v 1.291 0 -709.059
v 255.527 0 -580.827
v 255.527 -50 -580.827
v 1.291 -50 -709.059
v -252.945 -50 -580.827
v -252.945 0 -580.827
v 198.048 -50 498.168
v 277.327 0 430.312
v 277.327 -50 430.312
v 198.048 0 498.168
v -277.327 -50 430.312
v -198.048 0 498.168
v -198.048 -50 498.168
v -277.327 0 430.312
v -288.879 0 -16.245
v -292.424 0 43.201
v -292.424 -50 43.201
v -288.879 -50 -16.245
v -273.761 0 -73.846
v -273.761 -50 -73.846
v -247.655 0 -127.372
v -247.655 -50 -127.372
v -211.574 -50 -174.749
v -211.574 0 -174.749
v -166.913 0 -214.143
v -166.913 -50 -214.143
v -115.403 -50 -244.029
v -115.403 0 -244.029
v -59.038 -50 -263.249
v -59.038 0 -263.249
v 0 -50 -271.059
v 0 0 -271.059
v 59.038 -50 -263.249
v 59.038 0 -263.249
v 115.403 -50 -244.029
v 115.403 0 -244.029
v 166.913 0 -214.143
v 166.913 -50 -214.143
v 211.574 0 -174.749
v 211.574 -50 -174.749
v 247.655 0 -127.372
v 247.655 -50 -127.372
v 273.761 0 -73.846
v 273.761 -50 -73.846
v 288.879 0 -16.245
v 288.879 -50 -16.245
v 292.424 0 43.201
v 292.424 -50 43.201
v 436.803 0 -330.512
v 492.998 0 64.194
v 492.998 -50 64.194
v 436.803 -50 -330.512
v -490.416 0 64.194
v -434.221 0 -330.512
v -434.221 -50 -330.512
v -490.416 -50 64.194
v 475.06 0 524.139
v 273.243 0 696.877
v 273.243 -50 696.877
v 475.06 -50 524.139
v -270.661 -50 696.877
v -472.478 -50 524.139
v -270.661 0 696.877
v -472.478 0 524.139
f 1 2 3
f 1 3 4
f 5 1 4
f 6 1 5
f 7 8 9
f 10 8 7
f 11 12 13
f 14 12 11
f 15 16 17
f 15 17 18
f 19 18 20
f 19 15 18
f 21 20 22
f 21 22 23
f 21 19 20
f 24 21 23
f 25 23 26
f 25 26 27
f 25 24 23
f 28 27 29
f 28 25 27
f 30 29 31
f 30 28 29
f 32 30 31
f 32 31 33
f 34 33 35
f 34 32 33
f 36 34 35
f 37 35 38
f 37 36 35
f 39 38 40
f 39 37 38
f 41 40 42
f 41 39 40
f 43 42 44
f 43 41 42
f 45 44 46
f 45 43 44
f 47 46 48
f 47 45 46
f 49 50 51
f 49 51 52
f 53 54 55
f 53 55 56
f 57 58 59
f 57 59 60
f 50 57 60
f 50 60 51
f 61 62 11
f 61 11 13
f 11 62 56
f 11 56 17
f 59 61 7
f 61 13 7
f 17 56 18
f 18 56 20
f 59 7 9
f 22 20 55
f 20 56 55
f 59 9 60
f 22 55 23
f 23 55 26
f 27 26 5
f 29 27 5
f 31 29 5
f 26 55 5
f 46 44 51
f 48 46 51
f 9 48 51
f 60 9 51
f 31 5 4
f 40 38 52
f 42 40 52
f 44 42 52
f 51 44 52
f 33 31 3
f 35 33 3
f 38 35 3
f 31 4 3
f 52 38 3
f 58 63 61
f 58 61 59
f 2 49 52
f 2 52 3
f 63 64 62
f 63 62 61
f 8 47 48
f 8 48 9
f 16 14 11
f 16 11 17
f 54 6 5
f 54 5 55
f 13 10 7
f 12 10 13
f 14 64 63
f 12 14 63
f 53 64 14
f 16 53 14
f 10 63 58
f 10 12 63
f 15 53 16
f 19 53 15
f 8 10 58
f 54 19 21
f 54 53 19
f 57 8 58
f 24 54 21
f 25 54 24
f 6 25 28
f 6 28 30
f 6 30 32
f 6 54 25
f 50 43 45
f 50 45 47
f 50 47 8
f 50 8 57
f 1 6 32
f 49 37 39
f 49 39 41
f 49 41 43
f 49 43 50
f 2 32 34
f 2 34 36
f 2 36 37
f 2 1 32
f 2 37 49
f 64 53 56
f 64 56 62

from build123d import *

# Parameters (mm, degrees)
BOSS_EXTRUDE1_DEPTH = 50


with BuildPart() as part:
    # Sketch1 → Boss-Extrude1 (new body)
    with BuildSketch(Plane(origin=(0, 0, 0), x_dir=(1, 0, 0), z_dir=(0, 1, 0))):
        Polygon((-490.415824699, -64.194072769), (-472.477870031, -524.138824529), (-270.660991621, -696.876695154), (273.24324441, -696.876695154), (475.06012282, -524.138824529), (492.998077488, -64.194072769), (436.803486749, 330.511591748), (255.52688097, 580.827312496), (1.291126394, 709.058947943), (-252.944628181, 580.827312496), (-434.22123396, 330.511591748), align=None)
        with BuildLine():
            Line((198.047881985, -498.167821548), (-198.047881985, -498.167821548))
            Line((-198.047881985, -498.167821548), (-277.326571574, -430.312089493))
            Line((-277.326571574, -430.312089493), (-292.42397797, -43.20146483))
            ThreePointArc((-292.42397797, -43.20146483), (-211.574023689, 174.749059805), (0, 271.058866137))
            ThreePointArc((0, 271.058866137), (211.574023689, 174.749059805), (292.42397797, -43.20146483))
            Line((292.42397797, -43.20146483), (277.326571574, -430.312089493))
            Line((277.326571574, -430.312089493), (198.047881985, -498.167821548))
        make_face(mode=Mode.SUBTRACT)
    extrude(amount=-BOSS_EXTRUDE1_DEPTH)


solid = part.part
